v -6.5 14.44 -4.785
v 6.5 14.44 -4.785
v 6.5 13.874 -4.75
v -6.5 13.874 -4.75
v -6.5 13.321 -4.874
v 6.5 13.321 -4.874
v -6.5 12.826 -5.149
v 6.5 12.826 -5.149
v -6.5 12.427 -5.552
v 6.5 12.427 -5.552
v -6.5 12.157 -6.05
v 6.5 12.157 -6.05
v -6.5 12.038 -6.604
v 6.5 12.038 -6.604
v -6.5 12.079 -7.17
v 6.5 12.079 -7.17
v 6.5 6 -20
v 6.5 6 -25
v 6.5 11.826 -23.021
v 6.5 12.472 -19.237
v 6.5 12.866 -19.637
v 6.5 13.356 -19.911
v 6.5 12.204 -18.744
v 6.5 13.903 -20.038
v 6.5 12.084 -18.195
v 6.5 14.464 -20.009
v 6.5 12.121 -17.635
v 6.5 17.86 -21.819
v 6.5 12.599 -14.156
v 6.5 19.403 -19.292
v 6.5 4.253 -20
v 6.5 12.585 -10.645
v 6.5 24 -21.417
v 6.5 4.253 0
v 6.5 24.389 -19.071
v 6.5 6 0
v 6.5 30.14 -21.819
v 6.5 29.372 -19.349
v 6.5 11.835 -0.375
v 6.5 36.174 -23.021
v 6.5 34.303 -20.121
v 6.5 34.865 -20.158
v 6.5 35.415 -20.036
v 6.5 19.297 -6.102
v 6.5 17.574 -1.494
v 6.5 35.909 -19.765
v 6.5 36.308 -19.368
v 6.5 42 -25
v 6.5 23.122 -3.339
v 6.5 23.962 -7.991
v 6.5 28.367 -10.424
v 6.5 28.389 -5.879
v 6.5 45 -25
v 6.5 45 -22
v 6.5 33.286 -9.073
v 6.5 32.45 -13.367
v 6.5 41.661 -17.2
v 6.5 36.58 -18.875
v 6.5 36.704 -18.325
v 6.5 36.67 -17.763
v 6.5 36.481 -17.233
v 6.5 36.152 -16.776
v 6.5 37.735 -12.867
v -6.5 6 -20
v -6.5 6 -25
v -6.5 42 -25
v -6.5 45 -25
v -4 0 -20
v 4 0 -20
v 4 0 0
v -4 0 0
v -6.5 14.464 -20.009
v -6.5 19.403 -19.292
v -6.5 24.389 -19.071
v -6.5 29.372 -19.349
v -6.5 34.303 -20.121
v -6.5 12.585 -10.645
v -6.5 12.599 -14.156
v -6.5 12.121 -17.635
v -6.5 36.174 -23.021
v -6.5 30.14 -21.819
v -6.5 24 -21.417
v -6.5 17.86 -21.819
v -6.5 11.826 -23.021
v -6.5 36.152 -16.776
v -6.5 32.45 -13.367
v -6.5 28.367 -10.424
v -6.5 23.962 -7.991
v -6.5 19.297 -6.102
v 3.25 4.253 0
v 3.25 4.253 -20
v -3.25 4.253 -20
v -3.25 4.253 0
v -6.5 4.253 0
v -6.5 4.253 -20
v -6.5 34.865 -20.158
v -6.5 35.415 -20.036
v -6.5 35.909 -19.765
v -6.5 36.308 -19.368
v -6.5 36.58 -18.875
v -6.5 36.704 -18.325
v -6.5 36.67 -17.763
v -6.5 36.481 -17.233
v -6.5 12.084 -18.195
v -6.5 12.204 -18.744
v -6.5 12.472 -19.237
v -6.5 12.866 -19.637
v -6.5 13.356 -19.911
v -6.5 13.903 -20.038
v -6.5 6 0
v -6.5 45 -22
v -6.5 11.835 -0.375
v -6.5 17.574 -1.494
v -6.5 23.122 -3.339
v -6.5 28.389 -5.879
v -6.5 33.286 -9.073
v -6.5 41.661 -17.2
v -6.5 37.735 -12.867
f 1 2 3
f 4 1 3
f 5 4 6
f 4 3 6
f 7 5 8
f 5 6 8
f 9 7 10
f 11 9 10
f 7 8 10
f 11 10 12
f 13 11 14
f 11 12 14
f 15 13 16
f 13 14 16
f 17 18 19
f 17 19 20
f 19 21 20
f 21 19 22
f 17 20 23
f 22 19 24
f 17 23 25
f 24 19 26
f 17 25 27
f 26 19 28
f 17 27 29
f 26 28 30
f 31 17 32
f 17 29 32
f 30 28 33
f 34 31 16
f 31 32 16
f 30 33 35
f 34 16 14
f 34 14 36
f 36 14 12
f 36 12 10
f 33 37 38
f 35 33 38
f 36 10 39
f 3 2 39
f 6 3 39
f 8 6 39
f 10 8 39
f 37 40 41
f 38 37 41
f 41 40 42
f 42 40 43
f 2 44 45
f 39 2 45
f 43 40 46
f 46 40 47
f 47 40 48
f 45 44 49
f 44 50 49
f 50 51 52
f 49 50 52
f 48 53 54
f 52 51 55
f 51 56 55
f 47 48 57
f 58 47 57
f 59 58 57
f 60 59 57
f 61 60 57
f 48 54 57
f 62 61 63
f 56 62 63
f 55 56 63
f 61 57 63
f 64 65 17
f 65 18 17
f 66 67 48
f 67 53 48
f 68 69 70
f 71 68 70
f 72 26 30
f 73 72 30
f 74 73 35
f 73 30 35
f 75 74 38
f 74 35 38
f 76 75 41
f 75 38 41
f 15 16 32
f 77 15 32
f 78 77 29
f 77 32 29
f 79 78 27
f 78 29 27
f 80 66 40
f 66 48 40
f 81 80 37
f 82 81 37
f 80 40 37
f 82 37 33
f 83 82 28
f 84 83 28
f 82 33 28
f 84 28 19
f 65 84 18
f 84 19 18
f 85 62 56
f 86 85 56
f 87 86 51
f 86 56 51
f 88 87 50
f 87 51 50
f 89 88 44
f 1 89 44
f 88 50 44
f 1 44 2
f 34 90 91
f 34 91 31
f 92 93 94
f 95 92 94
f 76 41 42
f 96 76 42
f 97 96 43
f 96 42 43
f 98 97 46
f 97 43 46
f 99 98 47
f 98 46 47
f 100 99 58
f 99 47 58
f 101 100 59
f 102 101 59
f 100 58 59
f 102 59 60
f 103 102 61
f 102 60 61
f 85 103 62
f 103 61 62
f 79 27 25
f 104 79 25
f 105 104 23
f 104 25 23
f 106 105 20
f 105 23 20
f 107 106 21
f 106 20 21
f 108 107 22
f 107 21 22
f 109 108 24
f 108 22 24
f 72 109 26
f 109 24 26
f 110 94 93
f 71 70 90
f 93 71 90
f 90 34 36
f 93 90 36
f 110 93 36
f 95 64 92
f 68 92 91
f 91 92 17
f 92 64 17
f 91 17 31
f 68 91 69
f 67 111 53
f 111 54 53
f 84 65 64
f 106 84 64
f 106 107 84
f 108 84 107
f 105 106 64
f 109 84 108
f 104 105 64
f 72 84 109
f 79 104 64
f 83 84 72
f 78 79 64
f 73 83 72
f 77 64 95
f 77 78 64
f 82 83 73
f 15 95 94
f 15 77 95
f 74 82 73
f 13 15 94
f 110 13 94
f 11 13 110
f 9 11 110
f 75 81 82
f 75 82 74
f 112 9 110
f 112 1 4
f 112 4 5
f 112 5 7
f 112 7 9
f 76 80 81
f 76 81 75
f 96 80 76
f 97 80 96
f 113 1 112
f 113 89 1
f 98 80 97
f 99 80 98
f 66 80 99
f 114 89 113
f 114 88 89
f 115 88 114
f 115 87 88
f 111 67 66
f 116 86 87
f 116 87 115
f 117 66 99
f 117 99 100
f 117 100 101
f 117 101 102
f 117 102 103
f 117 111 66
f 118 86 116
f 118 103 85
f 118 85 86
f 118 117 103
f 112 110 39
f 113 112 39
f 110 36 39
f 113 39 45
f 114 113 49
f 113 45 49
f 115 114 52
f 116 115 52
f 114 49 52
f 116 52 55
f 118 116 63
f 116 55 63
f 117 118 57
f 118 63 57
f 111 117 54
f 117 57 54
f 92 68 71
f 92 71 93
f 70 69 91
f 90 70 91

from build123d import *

# Parameters (mm, degrees)
EXTRUDE_1_DEPTH     = 6.5
CUT_EXTRUDE_2_REACH = 53.887
CUT_EXTRUDE_3_REACH = 55.094


with BuildPart() as part:
    # 草图1 → 凸台-拉伸1 (new, symmetric)
    with BuildSketch(Plane(origin=(0, 0, 0), x_dir=(0, 0, -1), z_dir=(1, 0, 0))):
        with BuildLine():
            Line((0, 0), (0, 6))
            ThreePointArc((0, 6), (5.87927664, 28.388613177), (22, 45))
            Line((22, 45), (25, 45))
            Line((25, 45), (25, 42))
            ThreePointArc((25, 42), (21.416586692, 24), (25, 6))
            Line((25, 6), (20, 6))
            Line((20, 6), (20, 0))
            Line((20, 0), (0, 0))
        make_face()
    extrude(amount=EXTRUDE_1_DEPTH, both=True)

    # 草图2 → 切除-拉伸2 (cut, up to next)
    with BuildSketch(Plane.XY, mode=Mode.PRIVATE) as cut_extrude_2_sk1:
        Polygon((-6.5, 0), (-4, 0), (-3.25, 4.253461365), (-6.5, 4.253461365), align=None)
    cut_extrude_2_tool1 = extrude(cut_extrude_2_sk1.sketch, amount=-CUT_EXTRUDE_2_REACH, mode=Mode.PRIVATE) & part.part
    # 草图2 → 切除-拉伸2 (cut, up to next)
    with BuildSketch(Plane.XY, mode=Mode.PRIVATE) as cut_extrude_2_sk2:
        Polygon((6.5, 0), (4, 0), (3.25, 4.253461365), (6.5, 4.253461365), align=None)
    cut_extrude_2_tool2 = extrude(cut_extrude_2_sk2.sketch, amount=-CUT_EXTRUDE_2_REACH, mode=Mode.PRIVATE) & part.part
    add(cut_extrude_2_tool1.solids().sort_by_distance((-5.054348, 2.219197, 0))[0], mode=Mode.SUBTRACT)
    add(cut_extrude_2_tool2.solids().sort_by_distance((5.054348, 2.219197, 0))[0], mode=Mode.SUBTRACT)

    # 草图3 → 切除-拉伸3 (cut, up to next)
    with BuildSketch(Plane(origin=(6.5, 0, 0), x_dir=(0, 0, -1), z_dir=(1, 0, 0)), mode=Mode.PRIVATE) as cut_extrude_3_sk1:
        with BuildLine():
            ThreePointArc((7.169736852, 12.07909507), (12.400276965, 12.65373917), (17.63523501, 12.120841452))
            ThreePointArc((17.63523501, 12.120841452), (19.45114939, 12.654920589), (20.008524733, 14.463820333))
            ThreePointArc((20.008524733, 14.463820333), (19.071107342, 24.389014044), (20.121422197, 34.302896243))
            ThreePointArc((20.121422197, 34.302896243), (19.130864623, 36.4613018), (16.77629627, 36.151581393))
            ThreePointArc((16.77629627, 36.151581393), (9.141463638, 26.201122888), (4.785137328, 14.439970103))
            ThreePointArc((4.785137328, 14.439970103), (5.336190032, 12.611841621), (7.169736852, 12.07909507))
        make_face()
    cut_extrude_3_tool1 = extrude(cut_extrude_3_sk1.sketch, amount=-CUT_EXTRUDE_3_REACH, mode=Mode.PRIVATE) & part.part
    add(cut_extrude_3_tool1.solids().sort_by_distance((6.5, 22.129704, -13.663141))[0], mode=Mode.SUBTRACT)


solid = part.part
